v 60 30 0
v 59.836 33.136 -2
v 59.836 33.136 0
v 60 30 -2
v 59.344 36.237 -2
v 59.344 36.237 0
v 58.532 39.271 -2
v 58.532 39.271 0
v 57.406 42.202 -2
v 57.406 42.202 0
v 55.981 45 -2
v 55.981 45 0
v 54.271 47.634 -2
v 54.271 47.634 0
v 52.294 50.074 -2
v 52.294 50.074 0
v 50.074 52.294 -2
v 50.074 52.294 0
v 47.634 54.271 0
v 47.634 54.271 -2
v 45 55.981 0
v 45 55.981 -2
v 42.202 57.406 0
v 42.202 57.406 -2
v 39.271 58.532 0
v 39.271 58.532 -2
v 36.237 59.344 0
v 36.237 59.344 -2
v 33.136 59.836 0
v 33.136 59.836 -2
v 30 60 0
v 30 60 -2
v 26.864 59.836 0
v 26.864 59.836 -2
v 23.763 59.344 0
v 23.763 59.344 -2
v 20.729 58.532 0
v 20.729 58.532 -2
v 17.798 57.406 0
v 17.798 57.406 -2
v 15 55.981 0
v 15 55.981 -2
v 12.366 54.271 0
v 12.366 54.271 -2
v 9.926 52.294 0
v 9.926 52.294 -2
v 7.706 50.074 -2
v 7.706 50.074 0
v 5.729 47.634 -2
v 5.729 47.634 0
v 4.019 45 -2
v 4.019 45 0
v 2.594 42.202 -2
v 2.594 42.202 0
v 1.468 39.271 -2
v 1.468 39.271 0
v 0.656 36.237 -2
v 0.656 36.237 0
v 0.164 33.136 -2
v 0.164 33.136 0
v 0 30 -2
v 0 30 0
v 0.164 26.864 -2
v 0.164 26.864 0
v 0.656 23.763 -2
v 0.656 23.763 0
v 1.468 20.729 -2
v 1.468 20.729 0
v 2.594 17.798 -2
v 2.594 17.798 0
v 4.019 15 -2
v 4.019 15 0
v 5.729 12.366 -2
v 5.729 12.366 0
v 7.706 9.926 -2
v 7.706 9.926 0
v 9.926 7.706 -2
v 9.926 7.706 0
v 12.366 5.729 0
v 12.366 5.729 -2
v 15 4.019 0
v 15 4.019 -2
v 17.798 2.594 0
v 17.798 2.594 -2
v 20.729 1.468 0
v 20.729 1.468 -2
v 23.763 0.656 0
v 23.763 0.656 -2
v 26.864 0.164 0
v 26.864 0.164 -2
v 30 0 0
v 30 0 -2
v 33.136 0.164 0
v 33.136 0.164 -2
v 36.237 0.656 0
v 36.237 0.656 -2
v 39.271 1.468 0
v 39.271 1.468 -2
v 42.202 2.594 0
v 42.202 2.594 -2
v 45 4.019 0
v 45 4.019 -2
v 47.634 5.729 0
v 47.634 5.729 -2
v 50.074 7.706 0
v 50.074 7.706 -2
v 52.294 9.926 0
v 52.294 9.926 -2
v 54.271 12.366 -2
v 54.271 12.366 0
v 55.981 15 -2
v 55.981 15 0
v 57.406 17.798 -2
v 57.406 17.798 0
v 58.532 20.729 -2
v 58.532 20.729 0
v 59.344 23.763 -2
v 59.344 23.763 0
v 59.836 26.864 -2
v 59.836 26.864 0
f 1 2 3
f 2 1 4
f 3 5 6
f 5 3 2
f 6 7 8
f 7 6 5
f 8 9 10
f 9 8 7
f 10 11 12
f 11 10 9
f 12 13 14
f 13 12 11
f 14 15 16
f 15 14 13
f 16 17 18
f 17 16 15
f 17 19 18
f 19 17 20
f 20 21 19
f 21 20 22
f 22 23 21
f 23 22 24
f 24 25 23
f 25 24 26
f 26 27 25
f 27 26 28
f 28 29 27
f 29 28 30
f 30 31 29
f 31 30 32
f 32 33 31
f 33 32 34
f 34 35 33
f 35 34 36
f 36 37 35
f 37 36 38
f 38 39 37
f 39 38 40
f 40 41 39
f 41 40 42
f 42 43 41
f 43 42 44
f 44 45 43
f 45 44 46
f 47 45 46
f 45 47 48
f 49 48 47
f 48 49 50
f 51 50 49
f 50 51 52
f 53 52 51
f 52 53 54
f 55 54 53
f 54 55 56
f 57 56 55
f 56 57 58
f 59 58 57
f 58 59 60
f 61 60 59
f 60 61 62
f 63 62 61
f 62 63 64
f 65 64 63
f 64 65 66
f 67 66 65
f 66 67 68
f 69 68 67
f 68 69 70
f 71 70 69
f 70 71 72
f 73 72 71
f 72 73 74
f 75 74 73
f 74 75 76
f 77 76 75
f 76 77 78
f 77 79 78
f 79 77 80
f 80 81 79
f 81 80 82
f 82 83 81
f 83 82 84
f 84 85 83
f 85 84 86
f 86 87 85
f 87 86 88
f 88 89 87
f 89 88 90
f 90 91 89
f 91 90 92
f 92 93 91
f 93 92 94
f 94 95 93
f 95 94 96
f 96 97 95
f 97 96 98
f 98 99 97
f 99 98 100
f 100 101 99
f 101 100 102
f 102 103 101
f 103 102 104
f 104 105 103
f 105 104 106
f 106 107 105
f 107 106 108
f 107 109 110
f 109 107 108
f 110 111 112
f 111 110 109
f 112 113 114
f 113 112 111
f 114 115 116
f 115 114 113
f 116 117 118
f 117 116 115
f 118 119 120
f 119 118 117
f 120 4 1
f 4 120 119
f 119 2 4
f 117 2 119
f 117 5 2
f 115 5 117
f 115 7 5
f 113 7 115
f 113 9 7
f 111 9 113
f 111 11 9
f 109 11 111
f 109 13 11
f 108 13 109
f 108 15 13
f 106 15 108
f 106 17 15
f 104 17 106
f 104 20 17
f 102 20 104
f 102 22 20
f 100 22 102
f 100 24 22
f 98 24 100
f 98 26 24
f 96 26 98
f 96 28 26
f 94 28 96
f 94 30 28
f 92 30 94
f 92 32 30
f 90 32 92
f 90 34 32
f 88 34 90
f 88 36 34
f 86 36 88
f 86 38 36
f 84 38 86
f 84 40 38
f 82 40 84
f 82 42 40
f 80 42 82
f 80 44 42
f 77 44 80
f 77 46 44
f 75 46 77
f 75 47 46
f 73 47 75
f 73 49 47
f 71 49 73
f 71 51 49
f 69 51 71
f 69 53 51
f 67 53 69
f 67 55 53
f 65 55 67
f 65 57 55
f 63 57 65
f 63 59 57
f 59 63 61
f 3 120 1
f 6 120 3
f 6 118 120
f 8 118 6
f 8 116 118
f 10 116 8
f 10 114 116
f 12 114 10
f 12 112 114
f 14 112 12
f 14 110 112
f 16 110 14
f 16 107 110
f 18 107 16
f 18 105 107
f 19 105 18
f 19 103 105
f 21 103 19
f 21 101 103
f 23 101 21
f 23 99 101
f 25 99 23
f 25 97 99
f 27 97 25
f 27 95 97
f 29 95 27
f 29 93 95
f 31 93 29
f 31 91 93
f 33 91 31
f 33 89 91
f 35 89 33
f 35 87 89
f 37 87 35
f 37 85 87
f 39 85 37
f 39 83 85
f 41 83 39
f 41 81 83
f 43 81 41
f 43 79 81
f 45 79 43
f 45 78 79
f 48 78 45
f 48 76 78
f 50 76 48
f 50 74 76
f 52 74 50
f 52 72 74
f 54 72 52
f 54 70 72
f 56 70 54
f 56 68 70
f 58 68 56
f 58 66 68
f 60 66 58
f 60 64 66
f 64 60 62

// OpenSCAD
/*
================================================================================
   Parametric 3D Image Relief & Badge Generator (PNG/Grayscale to 3D)
   Designed by Antigravity
   
   This script turns any black & white or grayscale PNG image into a 
   3D printable relief, badge, or coin using OpenSCAD's surface() engine.
================================================================================
*/

/* [Image Configuration] */
// Path to the black & white or grayscale PNG file (relative or absolute).
image_file = "logo.png"; 

// The width of the image in pixels (open the image properties to check this).
image_width_pixels = 256; // [50:10:4000]

// The height of the image in pixels.
image_height_pixels = 256; // [50:10:4000]

// Invert colors: Enabled = black areas stick out; Disabled = white areas stick out.
invert_colors = false;

/* [Physical Size (mm)] */
// The desired physical width of your 3D print (in mm). Height scales proportionally.
target_width_mm = 60; // [10:1:250]

// How much the image features should protrude/stick out (in mm).
relief_height_mm = 2.0; // [0.2:0.1:10.0]

// Thickness of the backing plate/base (in mm).
base_thickness_mm = 2.0; // [0.5:0.1:15.0]

/* [Badge Style] */
// Shape of the backing plate.
badge_style = "circle"; // [rectangle, round_rect, circle]

// Rounding radius (only applies to "round_rect" style, in mm).
corner_radius = 5; // [1:1:30]

/* [Resolution] */
// Quality of circles and fillets (higher = smoother, slower render).
$fn = 60; // [30:5:150]


// =============================================================================
// MAIN 3D RELIEF GENERATOR MODULE
// =============================================================================

module image_relief(
    file,
    img_w,
    img_h,
    target_w,
    relief_h,
    base_t,
    style = "rectangle",
    r_corner = 5,
    invert = false
) {
    // Calculate aspect ratio and target height in mm
    aspect = img_h / img_w;
    target_h = target_w * aspect;
    
    // Scale factors
    // 1. XY scaling maps pixel coordinates (1px = 1mm) to target physical size
    scale_xy = target_w / img_w;
    
    // 2. Z scaling: surface() maps 8-bit pixels (0-255) to Z heights (0-255mm).
    scale_z = relief_h / 255;

    // A small offset (in mm) to sink the surface background slightly below the base top.
    // This completely eliminates Z-fighting in the renderer, keeping the base perfectly clean!
    z_offset = 0.05;

    union() {
        // ---------------------------------------------------------------------
        // 1. Backing Plate (Base) - Light Gray
        // ---------------------------------------------------------------------
        color("#E6E6E6") // Sleek light gray for the backing plate
        translate([0, 0, -base_t]) {
            if (style == "rectangle") {
                // Flat rectangle base
                cube([target_w, target_h, base_t]);
            } 
            else if (style == "round_rect") {
                // Rounded rectangle base
                linear_extrude(height = base_t) {
                    hull() {
                        translate([r_corner, r_corner]) circle(r = r_corner);
                        translate([target_w - r_corner, r_corner]) circle(r = r_corner);
                        translate([r_corner, target_h - r_corner]) circle(r = r_corner);
                        translate([target_w - r_corner, target_h - r_corner]) circle(r = r_corner);
                    }
                }
            } 
            else if (style == "circle") {
                // Circular base centered on the image
                translate([target_w / 2, target_h / 2, 0])
                    cylinder(h = base_t, r = max(target_w, target_h) / 2);
            }
        }

        // ---------------------------------------------------------------------
        // 2. The 3D Image Relief Surface - Dark Gray/Black
        // ---------------------------------------------------------------------
        color("#1A1A1A") // Contrasting dark gray/black for the relief artwork
        intersection() {
            // Clamping Volume: We clip the square surface to match the base shape!
            // This prevents the square corners of the image from sticking out.
            translate([0, 0, -z_offset]) {
                if (style == "rectangle") {
                    cube([target_w, target_h, relief_h + z_offset]);
                } 
                else if (style == "round_rect") {
                    linear_extrude(height = relief_h + z_offset) {
                        hull() {
                            translate([r_corner, r_corner]) circle(r = r_corner);
                            translate([target_w - r_corner, r_corner]) circle(r = r_corner);
                            translate([r_corner, target_h - r_corner]) circle(r = r_corner);
                            translate([target_w - r_corner, target_h - r_corner]) circle(r = r_corner);
                        }
                    }
                } 
                else if (style == "circle") {
                    translate([target_w / 2, target_h / 2, 0])
                        cylinder(h = relief_h + z_offset, r = max(target_w, target_h) / 2);
                }
            }

            // The actual image surface, sunk slightly by z_offset to hide the background inside the base.
            translate([0, 0, -z_offset])
                scale([scale_xy, scale_xy, scale_z]) {
                    surface(file = file, center = false, invert = invert);
                }
        }
    }
}

// =============================================================================
// MODEL INSTANTIATION
// =============================================================================

// Instantiate the module with our parameters
image_relief(
    file = image_file,
    img_w = image_width_pixels,
    img_h = image_height_pixels,
    target_w = target_width_mm,
    relief_h = relief_height_mm,
    base_t = base_thickness_mm,
    style = badge_style,
    r_corner = corner_radius,
    invert = invert_colors
);
